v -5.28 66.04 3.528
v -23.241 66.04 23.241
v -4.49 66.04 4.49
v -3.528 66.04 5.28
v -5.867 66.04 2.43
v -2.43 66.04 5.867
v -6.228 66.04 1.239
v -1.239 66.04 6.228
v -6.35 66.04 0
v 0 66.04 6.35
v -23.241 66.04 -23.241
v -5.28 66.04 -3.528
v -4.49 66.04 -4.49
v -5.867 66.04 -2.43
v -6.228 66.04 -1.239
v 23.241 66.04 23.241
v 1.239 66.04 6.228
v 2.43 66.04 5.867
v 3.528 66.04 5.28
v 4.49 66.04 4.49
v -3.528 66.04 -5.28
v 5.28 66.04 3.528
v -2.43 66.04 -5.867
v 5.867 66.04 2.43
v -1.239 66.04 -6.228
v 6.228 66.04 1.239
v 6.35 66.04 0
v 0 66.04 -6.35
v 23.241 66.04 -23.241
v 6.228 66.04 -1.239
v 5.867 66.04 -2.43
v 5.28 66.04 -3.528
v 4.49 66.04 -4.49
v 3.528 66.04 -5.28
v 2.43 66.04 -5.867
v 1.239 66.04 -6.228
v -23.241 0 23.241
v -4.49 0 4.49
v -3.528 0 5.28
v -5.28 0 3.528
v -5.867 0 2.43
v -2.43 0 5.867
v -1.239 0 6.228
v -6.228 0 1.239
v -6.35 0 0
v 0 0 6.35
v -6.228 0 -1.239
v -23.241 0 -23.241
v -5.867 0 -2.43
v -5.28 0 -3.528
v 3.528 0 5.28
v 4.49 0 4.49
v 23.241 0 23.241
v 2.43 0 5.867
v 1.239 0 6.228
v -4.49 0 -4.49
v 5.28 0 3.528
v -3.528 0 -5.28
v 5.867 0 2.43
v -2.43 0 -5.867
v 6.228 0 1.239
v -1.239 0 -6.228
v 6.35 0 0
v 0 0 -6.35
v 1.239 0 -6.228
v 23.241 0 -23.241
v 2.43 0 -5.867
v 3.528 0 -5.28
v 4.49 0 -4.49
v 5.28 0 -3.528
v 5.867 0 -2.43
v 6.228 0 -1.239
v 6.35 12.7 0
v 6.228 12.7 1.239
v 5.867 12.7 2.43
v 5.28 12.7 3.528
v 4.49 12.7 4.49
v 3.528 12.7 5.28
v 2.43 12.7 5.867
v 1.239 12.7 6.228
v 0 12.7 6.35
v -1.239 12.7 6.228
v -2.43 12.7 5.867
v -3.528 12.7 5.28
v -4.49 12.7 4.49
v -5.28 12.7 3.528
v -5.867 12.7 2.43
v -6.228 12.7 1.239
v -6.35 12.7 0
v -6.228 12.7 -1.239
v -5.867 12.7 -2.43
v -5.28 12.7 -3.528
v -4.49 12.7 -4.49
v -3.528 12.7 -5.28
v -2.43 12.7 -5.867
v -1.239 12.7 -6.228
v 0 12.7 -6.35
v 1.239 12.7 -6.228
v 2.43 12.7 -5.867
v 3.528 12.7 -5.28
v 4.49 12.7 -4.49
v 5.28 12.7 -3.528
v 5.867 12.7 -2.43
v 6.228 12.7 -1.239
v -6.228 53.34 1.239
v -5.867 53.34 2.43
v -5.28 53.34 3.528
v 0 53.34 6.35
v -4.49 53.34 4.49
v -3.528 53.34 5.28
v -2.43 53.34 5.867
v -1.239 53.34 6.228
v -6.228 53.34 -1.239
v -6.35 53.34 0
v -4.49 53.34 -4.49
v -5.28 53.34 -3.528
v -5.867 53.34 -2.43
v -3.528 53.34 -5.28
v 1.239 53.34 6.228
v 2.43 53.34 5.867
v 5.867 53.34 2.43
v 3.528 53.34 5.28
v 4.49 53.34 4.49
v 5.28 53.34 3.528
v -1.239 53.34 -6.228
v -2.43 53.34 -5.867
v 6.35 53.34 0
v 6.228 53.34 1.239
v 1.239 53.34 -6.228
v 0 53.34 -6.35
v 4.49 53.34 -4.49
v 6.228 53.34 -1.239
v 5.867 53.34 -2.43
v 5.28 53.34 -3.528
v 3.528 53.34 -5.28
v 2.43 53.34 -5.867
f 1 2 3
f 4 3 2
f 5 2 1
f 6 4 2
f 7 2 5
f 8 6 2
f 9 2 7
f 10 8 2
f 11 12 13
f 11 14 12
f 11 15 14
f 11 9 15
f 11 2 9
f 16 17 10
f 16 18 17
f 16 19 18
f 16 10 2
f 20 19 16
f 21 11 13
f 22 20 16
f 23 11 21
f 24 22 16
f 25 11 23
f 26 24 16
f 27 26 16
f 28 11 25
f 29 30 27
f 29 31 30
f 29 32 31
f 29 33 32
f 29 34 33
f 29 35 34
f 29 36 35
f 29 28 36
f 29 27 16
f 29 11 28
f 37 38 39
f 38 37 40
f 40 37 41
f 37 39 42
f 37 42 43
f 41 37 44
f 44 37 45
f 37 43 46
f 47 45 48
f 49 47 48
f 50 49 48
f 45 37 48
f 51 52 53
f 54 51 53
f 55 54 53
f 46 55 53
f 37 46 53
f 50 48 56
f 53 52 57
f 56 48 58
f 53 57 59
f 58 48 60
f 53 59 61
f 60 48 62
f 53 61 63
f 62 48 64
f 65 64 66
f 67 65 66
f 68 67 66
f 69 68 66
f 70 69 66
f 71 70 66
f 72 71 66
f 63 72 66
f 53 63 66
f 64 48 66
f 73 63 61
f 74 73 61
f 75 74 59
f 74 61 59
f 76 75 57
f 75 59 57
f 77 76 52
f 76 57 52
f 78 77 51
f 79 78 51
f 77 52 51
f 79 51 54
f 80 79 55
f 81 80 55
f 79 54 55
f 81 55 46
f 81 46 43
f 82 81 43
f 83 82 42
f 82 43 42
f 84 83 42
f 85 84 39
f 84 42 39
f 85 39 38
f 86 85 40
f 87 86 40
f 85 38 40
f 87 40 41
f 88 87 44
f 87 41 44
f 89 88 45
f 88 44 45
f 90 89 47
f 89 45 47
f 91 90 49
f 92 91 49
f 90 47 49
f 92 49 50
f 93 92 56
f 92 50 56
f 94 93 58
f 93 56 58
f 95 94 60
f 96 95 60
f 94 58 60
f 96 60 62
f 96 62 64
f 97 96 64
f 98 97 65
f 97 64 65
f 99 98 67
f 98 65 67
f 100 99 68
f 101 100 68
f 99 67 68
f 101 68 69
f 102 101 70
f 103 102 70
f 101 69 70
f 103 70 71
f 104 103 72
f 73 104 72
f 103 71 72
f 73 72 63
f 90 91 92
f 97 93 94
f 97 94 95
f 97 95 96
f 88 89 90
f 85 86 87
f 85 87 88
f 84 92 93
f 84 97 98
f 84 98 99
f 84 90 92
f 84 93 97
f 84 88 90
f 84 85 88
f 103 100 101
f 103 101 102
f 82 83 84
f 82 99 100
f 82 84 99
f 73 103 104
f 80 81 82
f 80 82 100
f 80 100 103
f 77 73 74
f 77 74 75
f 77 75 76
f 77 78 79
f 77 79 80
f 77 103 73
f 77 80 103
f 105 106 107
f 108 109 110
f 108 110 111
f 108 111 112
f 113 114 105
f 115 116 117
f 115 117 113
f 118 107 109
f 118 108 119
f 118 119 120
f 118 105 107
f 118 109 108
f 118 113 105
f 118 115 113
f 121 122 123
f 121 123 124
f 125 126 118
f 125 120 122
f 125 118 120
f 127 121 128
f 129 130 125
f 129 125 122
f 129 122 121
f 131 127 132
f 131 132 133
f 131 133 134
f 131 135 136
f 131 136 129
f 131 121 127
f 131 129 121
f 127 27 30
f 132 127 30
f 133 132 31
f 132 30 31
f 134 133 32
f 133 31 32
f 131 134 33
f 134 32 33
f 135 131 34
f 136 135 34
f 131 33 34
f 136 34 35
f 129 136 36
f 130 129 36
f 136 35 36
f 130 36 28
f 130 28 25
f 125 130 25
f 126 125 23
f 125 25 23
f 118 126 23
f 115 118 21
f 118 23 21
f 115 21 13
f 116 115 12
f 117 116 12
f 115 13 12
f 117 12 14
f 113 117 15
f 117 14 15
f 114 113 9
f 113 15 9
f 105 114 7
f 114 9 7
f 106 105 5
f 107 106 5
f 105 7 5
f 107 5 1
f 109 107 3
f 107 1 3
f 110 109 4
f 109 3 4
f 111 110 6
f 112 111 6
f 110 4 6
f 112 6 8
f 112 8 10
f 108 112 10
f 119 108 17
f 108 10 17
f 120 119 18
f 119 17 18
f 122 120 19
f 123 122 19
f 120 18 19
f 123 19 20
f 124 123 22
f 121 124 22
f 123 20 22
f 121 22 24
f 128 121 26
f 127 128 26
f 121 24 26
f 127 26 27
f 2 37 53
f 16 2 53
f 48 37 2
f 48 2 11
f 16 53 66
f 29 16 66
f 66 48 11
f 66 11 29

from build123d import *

# Parameters (mm, degrees)
SKETCH2_W           = 46.482
SKETCH2_H           = 46.482
BOSS_EXTRUDE1_DEPTH = 66.04
SKETCH3_R           = 6.35
CUT_EXTRUDE1_DEPTH  = 12.7
SKETCH4_R           = 6.35
CUT_EXTRUDE2_DEPTH  = 12.7


with BuildPart() as part:
    # Sketch2 → Boss-Extrude1 (new body)
    with BuildSketch(Plane(origin=(0, 0, 0), x_dir=(1, 0, 0), z_dir=(0, 1, 0))):
        Rectangle(SKETCH2_W, SKETCH2_H)
    extrude(amount=BOSS_EXTRUDE1_DEPTH)

    # Sketch3 → Cut-Extrude1 (cut)
    with BuildSketch(Plane(origin=(0, 66.04, 0), x_dir=(1, 0, 0), z_dir=(0, 1, 0))):
        Circle(SKETCH3_R)
    extrude(amount=-CUT_EXTRUDE1_DEPTH, mode=Mode.SUBTRACT)

    # Sketch4 → Cut-Extrude2 (cut)
    with BuildSketch(Plane.XZ):
        Circle(SKETCH4_R)
    extrude(amount=-CUT_EXTRUDE2_DEPTH, mode=Mode.SUBTRACT)


solid = part.part
